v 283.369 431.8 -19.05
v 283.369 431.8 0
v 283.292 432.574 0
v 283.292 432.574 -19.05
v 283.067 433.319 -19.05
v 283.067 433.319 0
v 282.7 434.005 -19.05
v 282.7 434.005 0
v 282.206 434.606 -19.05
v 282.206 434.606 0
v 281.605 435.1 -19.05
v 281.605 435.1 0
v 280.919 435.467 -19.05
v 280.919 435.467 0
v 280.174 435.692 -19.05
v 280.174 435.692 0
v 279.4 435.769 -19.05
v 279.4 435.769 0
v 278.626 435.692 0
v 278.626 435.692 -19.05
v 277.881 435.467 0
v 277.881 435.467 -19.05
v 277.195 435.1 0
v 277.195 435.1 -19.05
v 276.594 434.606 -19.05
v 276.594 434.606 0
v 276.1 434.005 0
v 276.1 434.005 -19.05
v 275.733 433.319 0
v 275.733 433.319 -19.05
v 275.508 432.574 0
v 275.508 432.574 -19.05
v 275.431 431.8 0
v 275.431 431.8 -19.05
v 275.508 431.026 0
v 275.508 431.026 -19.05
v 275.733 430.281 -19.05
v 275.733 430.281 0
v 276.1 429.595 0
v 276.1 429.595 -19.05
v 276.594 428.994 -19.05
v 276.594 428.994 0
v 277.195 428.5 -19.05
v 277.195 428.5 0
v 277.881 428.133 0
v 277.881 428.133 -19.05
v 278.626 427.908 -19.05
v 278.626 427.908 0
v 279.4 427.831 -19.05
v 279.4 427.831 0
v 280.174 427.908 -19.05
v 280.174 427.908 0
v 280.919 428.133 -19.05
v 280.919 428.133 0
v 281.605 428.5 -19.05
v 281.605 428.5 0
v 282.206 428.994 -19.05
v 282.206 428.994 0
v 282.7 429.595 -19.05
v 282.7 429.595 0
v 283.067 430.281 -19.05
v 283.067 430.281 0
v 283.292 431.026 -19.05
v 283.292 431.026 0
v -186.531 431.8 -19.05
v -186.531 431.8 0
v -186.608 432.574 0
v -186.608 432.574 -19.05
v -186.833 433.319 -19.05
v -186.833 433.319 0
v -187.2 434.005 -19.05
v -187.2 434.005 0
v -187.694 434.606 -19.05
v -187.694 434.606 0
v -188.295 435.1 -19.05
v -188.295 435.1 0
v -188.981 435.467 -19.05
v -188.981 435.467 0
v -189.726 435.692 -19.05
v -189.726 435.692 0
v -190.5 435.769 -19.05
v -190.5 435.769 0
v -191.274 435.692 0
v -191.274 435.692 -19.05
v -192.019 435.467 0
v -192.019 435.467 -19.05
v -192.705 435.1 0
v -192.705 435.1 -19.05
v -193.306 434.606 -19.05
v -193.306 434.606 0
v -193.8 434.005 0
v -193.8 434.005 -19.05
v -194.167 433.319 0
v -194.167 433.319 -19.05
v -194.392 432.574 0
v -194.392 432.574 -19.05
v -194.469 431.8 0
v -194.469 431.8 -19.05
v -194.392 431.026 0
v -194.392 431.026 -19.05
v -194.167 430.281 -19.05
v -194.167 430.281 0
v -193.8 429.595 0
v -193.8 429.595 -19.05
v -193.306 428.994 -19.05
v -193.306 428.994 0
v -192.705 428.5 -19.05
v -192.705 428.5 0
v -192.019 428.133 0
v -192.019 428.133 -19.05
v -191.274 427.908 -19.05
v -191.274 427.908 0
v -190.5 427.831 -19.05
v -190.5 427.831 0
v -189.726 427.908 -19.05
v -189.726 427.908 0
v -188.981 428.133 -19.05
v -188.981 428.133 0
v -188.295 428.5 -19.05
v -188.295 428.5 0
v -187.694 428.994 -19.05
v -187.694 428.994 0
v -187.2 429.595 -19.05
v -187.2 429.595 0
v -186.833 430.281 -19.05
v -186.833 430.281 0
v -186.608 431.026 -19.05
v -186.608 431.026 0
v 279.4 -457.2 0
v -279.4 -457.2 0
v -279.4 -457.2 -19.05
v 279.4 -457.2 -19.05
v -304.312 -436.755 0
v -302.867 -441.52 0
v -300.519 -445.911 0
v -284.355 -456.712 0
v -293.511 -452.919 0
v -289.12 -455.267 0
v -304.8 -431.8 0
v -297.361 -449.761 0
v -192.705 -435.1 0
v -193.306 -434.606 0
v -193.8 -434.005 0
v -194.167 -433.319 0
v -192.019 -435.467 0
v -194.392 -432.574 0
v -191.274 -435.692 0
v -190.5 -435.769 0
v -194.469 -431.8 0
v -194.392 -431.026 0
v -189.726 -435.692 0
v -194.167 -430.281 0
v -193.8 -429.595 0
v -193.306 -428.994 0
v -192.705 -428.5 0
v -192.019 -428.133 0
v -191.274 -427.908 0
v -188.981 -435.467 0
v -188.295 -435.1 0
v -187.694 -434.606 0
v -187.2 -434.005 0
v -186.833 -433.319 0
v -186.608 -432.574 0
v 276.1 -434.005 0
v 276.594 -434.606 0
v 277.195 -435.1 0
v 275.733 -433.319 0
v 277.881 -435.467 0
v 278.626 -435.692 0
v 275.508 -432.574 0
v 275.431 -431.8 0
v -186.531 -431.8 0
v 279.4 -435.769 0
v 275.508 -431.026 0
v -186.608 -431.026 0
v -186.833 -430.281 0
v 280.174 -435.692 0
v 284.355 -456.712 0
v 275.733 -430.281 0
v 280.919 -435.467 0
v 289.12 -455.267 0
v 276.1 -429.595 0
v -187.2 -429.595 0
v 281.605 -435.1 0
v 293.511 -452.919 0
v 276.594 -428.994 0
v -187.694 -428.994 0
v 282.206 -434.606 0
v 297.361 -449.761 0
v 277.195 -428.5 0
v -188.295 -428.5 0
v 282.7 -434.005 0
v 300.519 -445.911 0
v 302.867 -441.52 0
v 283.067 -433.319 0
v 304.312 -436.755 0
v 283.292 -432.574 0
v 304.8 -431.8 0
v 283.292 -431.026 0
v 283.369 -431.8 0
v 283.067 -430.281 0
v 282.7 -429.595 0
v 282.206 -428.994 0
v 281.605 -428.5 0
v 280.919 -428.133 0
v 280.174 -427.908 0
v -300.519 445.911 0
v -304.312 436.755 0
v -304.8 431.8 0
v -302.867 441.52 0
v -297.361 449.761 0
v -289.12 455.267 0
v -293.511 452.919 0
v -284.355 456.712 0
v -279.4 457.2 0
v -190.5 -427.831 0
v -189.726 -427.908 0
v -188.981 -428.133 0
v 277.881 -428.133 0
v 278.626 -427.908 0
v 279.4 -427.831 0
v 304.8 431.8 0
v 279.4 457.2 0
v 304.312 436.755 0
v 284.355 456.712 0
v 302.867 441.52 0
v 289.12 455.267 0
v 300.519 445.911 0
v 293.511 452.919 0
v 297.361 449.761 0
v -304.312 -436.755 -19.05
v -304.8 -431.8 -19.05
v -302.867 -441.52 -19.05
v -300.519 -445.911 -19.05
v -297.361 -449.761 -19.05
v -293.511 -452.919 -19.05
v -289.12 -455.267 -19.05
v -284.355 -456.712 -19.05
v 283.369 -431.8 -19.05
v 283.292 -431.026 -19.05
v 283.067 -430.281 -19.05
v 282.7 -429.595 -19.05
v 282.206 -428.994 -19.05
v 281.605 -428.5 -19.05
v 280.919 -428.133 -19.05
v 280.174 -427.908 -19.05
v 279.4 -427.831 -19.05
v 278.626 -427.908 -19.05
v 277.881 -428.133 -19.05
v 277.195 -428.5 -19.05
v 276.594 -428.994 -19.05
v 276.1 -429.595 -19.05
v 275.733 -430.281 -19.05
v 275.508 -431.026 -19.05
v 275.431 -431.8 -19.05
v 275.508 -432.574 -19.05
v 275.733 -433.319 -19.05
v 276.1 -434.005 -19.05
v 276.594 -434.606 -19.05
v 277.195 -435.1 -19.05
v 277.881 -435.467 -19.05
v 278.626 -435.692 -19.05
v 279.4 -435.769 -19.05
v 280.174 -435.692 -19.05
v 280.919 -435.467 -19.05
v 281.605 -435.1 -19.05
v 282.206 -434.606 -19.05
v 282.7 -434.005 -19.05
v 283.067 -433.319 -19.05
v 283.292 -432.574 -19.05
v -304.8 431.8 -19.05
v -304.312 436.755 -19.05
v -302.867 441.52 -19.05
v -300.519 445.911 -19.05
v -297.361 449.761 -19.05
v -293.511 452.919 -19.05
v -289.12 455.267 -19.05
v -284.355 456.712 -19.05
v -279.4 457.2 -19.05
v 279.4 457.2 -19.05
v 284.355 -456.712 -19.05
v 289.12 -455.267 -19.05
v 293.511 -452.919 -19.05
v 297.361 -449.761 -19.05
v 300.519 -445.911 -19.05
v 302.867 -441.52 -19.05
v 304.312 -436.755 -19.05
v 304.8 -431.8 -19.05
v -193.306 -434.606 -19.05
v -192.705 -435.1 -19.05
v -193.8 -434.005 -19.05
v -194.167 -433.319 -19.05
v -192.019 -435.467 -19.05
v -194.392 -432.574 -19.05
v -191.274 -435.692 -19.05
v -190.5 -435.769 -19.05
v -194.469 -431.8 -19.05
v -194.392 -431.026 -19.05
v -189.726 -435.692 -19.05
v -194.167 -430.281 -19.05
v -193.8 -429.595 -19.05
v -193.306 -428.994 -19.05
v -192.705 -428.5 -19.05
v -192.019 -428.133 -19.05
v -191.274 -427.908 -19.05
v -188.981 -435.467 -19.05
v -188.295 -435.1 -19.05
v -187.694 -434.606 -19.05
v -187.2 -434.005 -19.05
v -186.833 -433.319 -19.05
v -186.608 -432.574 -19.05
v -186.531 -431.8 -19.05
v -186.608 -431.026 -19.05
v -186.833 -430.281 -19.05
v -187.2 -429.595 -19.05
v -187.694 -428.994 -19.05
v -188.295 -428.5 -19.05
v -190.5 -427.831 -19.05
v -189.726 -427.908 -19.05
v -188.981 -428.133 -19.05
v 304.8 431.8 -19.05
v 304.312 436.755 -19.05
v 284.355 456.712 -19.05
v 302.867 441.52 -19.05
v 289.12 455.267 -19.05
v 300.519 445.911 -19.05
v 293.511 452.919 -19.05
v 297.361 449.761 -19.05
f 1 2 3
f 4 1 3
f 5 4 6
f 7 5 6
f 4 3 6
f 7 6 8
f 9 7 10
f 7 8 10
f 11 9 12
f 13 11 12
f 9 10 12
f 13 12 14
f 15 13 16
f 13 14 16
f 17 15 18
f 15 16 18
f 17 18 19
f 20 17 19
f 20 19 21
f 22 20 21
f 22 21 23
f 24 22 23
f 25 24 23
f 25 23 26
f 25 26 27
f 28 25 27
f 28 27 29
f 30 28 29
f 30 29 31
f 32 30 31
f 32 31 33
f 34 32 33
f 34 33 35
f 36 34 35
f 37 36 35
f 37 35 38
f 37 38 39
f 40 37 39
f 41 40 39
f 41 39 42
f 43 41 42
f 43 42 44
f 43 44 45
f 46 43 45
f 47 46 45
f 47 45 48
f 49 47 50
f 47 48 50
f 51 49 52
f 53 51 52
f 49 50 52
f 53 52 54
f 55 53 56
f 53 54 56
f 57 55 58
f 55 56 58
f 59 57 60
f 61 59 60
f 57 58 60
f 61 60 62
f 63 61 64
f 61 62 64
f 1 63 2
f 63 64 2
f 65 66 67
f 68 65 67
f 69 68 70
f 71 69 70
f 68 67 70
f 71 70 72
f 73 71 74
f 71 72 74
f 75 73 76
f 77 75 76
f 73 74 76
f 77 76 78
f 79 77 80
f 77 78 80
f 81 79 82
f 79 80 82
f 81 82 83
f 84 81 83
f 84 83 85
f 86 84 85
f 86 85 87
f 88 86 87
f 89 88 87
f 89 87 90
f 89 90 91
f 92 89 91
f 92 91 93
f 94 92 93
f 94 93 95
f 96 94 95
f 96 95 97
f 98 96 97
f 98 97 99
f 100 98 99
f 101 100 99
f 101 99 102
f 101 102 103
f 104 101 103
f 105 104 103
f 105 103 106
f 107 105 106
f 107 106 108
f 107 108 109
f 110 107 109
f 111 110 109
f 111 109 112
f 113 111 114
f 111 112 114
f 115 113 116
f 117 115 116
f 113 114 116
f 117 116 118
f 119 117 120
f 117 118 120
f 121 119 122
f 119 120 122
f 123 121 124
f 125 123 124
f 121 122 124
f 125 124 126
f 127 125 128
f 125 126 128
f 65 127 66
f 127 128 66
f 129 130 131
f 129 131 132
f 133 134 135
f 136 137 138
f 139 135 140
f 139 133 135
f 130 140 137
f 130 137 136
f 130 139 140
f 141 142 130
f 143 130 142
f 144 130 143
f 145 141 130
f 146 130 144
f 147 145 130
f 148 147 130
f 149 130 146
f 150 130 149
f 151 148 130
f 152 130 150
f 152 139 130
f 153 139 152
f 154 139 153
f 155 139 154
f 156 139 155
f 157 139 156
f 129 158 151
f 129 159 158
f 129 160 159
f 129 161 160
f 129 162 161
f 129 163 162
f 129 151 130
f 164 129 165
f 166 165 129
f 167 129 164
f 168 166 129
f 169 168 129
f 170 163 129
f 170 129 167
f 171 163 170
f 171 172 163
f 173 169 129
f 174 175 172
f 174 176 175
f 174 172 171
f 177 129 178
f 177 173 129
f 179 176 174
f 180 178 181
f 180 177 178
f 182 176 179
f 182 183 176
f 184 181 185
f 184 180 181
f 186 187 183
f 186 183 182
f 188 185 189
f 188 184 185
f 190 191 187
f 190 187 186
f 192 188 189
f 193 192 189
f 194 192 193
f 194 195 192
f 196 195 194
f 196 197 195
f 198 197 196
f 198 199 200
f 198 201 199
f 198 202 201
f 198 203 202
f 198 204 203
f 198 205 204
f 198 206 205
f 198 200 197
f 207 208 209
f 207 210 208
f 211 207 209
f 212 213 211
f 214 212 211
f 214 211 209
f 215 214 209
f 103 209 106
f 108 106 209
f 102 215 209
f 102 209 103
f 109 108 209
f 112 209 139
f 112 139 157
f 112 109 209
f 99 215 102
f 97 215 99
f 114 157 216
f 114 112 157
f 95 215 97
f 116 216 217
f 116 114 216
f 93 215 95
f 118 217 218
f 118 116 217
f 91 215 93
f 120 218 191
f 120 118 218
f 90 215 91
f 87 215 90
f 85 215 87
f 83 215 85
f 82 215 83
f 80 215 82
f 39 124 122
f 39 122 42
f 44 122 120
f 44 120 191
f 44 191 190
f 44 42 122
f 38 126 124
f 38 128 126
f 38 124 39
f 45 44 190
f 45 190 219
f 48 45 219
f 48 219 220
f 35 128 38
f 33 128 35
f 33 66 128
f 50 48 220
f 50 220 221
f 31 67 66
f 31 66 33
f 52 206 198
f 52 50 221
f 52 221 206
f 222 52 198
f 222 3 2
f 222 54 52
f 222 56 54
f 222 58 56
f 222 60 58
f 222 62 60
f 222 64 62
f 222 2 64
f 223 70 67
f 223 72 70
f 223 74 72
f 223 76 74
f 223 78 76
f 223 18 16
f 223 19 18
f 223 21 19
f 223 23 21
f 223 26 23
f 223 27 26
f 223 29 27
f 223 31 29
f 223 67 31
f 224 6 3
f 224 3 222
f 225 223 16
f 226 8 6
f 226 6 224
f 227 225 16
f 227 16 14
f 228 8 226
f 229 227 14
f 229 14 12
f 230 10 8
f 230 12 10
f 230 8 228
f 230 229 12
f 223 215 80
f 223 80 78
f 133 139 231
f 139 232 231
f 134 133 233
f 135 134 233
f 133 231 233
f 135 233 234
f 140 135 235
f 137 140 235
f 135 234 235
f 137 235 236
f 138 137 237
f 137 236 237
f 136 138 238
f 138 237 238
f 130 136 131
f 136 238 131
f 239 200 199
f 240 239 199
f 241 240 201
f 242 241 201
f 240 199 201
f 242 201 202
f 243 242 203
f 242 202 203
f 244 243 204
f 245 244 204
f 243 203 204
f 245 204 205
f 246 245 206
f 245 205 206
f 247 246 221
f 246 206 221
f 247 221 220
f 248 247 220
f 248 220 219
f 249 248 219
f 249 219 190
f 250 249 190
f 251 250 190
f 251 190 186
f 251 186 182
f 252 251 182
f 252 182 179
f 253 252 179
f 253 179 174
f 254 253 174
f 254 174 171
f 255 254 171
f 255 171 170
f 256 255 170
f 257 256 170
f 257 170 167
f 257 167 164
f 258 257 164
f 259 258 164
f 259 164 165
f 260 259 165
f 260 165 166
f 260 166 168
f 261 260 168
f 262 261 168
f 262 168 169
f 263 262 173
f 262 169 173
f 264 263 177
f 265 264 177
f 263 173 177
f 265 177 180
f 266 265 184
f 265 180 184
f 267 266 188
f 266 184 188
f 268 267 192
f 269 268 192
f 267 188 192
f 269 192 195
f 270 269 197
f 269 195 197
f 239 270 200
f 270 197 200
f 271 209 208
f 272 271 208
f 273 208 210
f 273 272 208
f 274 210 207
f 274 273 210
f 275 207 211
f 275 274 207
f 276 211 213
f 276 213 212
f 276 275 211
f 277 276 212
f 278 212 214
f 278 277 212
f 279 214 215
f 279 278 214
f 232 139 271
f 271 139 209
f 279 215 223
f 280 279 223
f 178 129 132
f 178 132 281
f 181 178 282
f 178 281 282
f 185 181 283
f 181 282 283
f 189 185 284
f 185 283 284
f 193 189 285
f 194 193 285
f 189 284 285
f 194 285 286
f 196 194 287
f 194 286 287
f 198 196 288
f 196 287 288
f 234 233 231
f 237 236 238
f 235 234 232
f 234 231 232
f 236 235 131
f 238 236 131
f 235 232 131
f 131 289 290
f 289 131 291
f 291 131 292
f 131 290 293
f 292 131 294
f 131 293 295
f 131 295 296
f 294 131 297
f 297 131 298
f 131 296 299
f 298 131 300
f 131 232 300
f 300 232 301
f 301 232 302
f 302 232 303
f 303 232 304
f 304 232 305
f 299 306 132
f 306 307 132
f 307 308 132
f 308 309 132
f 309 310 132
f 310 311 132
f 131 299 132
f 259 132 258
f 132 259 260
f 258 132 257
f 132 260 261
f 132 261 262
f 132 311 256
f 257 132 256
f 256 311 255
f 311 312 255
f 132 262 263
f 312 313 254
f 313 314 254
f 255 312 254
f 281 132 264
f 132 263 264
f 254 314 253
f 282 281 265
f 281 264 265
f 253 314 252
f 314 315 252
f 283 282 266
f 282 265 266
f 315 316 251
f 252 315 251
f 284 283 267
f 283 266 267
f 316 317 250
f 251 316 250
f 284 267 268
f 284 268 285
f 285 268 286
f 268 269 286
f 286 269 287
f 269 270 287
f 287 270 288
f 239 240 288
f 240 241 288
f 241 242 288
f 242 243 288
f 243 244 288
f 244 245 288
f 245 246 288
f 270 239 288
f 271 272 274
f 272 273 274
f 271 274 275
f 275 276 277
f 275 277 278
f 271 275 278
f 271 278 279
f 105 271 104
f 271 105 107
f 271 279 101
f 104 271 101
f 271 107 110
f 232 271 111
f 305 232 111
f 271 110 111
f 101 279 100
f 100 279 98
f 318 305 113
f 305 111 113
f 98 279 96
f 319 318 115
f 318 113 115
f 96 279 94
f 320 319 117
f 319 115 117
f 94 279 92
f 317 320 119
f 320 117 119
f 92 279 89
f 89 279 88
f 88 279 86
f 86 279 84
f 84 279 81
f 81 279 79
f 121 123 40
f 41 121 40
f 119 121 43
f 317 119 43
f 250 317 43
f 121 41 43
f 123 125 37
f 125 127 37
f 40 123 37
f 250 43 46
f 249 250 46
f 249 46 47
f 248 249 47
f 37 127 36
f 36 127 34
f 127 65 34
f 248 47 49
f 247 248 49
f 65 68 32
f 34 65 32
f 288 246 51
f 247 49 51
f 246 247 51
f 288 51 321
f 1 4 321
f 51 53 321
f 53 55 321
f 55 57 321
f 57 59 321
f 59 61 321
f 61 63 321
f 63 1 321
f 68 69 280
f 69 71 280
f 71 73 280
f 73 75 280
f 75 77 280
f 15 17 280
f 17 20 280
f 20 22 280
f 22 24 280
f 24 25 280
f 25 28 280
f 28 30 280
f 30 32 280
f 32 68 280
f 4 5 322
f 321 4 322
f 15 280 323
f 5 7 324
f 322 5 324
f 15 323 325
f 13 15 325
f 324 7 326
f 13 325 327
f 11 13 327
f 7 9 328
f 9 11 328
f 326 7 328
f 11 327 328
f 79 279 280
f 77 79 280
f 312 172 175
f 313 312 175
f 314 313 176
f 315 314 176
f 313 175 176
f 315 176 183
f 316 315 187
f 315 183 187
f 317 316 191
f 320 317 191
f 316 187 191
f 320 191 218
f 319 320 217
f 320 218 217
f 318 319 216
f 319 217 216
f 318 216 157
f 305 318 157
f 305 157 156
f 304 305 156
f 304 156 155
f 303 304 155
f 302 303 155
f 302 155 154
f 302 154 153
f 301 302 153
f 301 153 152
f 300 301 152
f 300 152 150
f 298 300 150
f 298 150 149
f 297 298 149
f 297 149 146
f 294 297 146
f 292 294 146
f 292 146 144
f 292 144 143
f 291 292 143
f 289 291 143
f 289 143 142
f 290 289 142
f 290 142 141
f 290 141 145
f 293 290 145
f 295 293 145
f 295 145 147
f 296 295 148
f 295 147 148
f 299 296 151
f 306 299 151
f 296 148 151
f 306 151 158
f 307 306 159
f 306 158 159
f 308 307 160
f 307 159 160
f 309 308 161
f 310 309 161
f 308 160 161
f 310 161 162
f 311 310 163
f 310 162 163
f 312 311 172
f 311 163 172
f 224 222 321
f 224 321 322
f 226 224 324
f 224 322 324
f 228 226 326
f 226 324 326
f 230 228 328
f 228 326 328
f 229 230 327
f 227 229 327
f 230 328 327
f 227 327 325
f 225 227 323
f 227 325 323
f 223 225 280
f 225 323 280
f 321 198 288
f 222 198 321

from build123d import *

# Parameters (mm, degrees)
F0_W     = 609.6
F0_H     = 914.4
F1_DEPTH = 19.05
F2_R     = 25.4
F3_R     = 3.96875
F4_DEPTH = 19.051


with BuildPart() as f1:
    # F0 (on Top) → F1 (new body)
    with BuildSketch(Plane.XY):
        Rectangle(F0_W, F0_H)
    extrude(amount=-F1_DEPTH)

    # F2
    f2_edges = [f1.edges().sort_by_distance(p)[0] for p in [
        (-304.8, -457.2, -9.525),
        (-304.8, 457.2, -9.525),
        (304.8, 457.2, -9.525),
        (304.8, -457.2, -9.525),
    ]]
    fillet(f2_edges, radius=F2_R)

    # F3 (on face) → F4 (cut, through all)
    with BuildSketch(Plane.XY):
        with Locations((-190.5, -431.8)):
            Circle(F3_R)
        with Locations((279.4, -431.8)):
            Circle(F3_R)
        with Locations((279.4, 431.8)):
            Circle(F3_R)
        with Locations((-190.5, 431.8)):
            Circle(F3_R)
    extrude(amount=-F4_DEPTH, mode=Mode.SUBTRACT)


solid = f1.part
